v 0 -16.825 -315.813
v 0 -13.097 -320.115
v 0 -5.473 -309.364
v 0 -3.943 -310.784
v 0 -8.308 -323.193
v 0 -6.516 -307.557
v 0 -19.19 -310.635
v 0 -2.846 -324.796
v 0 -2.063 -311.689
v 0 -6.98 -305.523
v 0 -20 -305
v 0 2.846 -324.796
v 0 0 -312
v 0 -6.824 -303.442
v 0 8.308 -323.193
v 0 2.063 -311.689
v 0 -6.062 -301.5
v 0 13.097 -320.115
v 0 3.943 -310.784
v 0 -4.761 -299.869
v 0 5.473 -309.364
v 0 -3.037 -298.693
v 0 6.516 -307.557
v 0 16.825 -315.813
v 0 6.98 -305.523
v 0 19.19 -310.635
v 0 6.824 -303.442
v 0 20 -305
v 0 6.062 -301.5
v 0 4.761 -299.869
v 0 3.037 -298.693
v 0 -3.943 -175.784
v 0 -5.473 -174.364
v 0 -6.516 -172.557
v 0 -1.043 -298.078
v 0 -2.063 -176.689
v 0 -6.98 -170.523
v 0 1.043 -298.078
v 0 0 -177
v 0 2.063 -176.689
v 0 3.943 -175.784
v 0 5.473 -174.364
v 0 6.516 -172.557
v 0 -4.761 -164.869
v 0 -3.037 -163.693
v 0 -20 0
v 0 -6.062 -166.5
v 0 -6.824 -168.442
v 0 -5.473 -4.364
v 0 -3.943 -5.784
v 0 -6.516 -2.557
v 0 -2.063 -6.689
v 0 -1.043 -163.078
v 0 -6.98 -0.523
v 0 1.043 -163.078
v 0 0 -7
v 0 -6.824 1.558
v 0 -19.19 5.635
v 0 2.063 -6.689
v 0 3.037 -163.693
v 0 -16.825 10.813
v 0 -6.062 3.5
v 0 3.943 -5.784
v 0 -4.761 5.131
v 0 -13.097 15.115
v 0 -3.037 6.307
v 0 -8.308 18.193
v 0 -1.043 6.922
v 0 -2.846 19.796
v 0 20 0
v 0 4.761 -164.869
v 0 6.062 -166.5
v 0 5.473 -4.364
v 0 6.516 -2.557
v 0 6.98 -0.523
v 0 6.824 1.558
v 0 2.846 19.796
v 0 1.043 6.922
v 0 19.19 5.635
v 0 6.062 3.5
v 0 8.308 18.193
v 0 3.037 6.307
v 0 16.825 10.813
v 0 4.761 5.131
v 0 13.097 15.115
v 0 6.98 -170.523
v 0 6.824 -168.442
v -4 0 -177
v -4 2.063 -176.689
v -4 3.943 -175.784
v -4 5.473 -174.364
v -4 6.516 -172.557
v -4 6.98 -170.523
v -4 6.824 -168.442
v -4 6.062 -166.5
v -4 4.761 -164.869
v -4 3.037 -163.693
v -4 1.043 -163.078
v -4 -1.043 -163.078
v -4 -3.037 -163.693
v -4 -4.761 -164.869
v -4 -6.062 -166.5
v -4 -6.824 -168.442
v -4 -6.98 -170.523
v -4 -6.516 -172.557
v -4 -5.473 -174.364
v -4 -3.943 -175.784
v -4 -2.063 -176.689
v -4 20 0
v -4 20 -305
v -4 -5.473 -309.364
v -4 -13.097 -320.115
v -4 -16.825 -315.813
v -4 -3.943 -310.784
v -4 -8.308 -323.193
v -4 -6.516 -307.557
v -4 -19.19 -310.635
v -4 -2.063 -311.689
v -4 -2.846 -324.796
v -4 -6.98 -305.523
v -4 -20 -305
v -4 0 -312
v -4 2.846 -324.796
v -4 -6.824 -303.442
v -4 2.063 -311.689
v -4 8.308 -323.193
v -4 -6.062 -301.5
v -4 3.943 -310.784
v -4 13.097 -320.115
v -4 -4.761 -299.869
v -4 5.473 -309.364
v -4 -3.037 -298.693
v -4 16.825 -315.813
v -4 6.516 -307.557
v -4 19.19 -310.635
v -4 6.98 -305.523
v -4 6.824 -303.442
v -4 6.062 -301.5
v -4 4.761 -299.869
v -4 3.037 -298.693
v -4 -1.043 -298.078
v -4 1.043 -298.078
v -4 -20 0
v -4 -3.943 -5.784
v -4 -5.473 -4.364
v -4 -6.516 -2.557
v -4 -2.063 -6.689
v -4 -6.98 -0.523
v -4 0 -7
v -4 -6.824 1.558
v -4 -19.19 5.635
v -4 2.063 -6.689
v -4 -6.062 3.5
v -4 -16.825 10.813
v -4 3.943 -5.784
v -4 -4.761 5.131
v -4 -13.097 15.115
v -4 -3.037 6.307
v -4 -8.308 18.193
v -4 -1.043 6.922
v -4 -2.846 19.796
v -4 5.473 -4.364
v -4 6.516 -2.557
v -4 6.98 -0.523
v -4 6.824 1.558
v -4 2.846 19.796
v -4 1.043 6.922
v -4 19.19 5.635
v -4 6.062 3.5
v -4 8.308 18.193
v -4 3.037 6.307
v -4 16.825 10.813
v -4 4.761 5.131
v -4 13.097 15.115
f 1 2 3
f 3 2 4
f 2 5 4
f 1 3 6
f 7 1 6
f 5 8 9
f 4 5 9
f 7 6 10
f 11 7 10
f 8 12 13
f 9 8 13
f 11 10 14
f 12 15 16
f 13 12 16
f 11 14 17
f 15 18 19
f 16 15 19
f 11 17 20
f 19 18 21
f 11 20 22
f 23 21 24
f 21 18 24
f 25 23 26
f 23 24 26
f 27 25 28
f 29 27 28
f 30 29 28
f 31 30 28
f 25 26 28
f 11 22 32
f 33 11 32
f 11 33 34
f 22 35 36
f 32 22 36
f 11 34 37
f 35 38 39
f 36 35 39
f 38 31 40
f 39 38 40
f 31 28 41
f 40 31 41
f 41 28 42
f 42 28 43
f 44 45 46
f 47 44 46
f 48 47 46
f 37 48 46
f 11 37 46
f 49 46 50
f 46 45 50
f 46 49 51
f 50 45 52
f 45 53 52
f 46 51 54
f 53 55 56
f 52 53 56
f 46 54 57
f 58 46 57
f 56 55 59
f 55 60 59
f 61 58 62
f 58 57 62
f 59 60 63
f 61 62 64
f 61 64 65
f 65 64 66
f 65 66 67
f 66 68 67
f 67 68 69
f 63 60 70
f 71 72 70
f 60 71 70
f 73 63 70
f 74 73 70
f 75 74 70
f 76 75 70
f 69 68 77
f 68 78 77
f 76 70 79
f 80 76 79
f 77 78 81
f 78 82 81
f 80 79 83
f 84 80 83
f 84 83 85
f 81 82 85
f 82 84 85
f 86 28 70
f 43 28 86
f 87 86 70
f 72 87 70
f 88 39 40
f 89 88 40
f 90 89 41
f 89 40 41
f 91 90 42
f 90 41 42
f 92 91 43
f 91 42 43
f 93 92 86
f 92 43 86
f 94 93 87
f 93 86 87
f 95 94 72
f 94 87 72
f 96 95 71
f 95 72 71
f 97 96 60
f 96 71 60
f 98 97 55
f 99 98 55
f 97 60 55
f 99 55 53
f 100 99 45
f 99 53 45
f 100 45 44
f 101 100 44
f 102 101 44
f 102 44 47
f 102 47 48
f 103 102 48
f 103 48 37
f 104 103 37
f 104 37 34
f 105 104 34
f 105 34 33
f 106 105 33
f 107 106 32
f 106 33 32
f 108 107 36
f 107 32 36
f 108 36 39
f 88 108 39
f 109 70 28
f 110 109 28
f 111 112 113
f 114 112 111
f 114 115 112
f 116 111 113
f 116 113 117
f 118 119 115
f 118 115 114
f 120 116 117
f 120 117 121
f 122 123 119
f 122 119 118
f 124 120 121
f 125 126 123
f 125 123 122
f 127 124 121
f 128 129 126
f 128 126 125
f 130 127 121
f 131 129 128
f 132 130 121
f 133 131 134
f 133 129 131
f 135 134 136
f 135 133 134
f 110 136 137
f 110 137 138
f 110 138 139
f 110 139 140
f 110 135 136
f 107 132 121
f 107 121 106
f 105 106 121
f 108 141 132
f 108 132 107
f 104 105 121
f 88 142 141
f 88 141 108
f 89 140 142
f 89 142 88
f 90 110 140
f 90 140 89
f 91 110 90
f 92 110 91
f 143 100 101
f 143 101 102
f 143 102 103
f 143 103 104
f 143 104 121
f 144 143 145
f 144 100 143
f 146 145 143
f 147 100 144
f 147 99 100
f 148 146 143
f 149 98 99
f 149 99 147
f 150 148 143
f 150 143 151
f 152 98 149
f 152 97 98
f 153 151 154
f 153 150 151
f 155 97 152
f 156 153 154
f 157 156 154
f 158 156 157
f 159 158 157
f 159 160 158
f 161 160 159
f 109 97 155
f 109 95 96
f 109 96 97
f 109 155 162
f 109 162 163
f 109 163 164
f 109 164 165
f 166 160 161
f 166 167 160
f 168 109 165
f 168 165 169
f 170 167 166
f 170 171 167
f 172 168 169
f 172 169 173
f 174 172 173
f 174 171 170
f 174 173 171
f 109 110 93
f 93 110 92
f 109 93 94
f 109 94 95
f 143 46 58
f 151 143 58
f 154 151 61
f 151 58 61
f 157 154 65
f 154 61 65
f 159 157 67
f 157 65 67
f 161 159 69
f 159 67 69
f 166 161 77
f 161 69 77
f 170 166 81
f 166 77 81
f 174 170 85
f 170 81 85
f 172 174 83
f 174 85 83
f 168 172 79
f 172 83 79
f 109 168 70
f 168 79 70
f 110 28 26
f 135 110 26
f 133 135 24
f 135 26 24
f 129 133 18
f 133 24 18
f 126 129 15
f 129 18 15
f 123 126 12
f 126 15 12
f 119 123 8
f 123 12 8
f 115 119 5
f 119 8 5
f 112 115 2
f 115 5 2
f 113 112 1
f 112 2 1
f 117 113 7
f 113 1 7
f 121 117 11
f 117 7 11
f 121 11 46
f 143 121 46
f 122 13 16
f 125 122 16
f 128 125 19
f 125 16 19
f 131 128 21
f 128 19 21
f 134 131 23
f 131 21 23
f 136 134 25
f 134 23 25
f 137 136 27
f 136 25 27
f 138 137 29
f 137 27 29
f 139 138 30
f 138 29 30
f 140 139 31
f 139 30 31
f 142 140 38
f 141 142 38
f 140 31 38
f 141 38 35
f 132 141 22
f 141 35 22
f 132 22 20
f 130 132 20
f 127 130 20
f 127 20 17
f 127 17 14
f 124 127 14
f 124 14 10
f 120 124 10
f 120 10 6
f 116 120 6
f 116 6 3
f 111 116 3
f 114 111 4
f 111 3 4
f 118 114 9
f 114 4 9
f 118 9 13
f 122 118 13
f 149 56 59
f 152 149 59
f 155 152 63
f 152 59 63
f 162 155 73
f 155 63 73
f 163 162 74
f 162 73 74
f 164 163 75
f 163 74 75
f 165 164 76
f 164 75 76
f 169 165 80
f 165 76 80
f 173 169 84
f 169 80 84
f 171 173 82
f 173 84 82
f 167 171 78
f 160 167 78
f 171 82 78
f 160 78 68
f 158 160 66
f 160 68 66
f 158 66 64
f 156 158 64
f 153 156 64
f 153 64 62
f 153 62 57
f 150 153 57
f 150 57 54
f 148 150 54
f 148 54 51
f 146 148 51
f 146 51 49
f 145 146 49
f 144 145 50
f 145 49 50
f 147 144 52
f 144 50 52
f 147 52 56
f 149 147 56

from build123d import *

# Parameters (mm, degrees)
SKETCH_1_R             = 7
SM_BASE_FLANGE_1_DEPTH = 4


# Sheet-metal steps are written as plain solids
with BuildPart() as part:
    # Sketch 1 → Базовая кромка1 (new body)
    with BuildSketch(Plane(origin=(0, 0, 0), x_dir=(0, 0, -1), z_dir=(1, 0, 0))):
        with BuildLine():
            Line((0, 20), (305, 20))
            ThreePointArc((305, 20), (325, 0), (305, -20))
            Line((305, -20), (0, -20))
            ThreePointArc((0, -20), (-20, 0), (0, 20))
        make_face()
        Circle(SKETCH_1_R, mode=Mode.SUBTRACT)
        with Locations((305, 0)):
            Circle(SKETCH_1_R, mode=Mode.SUBTRACT)
        with Locations((170, 0)):
            Circle(SKETCH_1_R, mode=Mode.SUBTRACT)
    extrude(amount=-SM_BASE_FLANGE_1_DEPTH)


solid = part.part
